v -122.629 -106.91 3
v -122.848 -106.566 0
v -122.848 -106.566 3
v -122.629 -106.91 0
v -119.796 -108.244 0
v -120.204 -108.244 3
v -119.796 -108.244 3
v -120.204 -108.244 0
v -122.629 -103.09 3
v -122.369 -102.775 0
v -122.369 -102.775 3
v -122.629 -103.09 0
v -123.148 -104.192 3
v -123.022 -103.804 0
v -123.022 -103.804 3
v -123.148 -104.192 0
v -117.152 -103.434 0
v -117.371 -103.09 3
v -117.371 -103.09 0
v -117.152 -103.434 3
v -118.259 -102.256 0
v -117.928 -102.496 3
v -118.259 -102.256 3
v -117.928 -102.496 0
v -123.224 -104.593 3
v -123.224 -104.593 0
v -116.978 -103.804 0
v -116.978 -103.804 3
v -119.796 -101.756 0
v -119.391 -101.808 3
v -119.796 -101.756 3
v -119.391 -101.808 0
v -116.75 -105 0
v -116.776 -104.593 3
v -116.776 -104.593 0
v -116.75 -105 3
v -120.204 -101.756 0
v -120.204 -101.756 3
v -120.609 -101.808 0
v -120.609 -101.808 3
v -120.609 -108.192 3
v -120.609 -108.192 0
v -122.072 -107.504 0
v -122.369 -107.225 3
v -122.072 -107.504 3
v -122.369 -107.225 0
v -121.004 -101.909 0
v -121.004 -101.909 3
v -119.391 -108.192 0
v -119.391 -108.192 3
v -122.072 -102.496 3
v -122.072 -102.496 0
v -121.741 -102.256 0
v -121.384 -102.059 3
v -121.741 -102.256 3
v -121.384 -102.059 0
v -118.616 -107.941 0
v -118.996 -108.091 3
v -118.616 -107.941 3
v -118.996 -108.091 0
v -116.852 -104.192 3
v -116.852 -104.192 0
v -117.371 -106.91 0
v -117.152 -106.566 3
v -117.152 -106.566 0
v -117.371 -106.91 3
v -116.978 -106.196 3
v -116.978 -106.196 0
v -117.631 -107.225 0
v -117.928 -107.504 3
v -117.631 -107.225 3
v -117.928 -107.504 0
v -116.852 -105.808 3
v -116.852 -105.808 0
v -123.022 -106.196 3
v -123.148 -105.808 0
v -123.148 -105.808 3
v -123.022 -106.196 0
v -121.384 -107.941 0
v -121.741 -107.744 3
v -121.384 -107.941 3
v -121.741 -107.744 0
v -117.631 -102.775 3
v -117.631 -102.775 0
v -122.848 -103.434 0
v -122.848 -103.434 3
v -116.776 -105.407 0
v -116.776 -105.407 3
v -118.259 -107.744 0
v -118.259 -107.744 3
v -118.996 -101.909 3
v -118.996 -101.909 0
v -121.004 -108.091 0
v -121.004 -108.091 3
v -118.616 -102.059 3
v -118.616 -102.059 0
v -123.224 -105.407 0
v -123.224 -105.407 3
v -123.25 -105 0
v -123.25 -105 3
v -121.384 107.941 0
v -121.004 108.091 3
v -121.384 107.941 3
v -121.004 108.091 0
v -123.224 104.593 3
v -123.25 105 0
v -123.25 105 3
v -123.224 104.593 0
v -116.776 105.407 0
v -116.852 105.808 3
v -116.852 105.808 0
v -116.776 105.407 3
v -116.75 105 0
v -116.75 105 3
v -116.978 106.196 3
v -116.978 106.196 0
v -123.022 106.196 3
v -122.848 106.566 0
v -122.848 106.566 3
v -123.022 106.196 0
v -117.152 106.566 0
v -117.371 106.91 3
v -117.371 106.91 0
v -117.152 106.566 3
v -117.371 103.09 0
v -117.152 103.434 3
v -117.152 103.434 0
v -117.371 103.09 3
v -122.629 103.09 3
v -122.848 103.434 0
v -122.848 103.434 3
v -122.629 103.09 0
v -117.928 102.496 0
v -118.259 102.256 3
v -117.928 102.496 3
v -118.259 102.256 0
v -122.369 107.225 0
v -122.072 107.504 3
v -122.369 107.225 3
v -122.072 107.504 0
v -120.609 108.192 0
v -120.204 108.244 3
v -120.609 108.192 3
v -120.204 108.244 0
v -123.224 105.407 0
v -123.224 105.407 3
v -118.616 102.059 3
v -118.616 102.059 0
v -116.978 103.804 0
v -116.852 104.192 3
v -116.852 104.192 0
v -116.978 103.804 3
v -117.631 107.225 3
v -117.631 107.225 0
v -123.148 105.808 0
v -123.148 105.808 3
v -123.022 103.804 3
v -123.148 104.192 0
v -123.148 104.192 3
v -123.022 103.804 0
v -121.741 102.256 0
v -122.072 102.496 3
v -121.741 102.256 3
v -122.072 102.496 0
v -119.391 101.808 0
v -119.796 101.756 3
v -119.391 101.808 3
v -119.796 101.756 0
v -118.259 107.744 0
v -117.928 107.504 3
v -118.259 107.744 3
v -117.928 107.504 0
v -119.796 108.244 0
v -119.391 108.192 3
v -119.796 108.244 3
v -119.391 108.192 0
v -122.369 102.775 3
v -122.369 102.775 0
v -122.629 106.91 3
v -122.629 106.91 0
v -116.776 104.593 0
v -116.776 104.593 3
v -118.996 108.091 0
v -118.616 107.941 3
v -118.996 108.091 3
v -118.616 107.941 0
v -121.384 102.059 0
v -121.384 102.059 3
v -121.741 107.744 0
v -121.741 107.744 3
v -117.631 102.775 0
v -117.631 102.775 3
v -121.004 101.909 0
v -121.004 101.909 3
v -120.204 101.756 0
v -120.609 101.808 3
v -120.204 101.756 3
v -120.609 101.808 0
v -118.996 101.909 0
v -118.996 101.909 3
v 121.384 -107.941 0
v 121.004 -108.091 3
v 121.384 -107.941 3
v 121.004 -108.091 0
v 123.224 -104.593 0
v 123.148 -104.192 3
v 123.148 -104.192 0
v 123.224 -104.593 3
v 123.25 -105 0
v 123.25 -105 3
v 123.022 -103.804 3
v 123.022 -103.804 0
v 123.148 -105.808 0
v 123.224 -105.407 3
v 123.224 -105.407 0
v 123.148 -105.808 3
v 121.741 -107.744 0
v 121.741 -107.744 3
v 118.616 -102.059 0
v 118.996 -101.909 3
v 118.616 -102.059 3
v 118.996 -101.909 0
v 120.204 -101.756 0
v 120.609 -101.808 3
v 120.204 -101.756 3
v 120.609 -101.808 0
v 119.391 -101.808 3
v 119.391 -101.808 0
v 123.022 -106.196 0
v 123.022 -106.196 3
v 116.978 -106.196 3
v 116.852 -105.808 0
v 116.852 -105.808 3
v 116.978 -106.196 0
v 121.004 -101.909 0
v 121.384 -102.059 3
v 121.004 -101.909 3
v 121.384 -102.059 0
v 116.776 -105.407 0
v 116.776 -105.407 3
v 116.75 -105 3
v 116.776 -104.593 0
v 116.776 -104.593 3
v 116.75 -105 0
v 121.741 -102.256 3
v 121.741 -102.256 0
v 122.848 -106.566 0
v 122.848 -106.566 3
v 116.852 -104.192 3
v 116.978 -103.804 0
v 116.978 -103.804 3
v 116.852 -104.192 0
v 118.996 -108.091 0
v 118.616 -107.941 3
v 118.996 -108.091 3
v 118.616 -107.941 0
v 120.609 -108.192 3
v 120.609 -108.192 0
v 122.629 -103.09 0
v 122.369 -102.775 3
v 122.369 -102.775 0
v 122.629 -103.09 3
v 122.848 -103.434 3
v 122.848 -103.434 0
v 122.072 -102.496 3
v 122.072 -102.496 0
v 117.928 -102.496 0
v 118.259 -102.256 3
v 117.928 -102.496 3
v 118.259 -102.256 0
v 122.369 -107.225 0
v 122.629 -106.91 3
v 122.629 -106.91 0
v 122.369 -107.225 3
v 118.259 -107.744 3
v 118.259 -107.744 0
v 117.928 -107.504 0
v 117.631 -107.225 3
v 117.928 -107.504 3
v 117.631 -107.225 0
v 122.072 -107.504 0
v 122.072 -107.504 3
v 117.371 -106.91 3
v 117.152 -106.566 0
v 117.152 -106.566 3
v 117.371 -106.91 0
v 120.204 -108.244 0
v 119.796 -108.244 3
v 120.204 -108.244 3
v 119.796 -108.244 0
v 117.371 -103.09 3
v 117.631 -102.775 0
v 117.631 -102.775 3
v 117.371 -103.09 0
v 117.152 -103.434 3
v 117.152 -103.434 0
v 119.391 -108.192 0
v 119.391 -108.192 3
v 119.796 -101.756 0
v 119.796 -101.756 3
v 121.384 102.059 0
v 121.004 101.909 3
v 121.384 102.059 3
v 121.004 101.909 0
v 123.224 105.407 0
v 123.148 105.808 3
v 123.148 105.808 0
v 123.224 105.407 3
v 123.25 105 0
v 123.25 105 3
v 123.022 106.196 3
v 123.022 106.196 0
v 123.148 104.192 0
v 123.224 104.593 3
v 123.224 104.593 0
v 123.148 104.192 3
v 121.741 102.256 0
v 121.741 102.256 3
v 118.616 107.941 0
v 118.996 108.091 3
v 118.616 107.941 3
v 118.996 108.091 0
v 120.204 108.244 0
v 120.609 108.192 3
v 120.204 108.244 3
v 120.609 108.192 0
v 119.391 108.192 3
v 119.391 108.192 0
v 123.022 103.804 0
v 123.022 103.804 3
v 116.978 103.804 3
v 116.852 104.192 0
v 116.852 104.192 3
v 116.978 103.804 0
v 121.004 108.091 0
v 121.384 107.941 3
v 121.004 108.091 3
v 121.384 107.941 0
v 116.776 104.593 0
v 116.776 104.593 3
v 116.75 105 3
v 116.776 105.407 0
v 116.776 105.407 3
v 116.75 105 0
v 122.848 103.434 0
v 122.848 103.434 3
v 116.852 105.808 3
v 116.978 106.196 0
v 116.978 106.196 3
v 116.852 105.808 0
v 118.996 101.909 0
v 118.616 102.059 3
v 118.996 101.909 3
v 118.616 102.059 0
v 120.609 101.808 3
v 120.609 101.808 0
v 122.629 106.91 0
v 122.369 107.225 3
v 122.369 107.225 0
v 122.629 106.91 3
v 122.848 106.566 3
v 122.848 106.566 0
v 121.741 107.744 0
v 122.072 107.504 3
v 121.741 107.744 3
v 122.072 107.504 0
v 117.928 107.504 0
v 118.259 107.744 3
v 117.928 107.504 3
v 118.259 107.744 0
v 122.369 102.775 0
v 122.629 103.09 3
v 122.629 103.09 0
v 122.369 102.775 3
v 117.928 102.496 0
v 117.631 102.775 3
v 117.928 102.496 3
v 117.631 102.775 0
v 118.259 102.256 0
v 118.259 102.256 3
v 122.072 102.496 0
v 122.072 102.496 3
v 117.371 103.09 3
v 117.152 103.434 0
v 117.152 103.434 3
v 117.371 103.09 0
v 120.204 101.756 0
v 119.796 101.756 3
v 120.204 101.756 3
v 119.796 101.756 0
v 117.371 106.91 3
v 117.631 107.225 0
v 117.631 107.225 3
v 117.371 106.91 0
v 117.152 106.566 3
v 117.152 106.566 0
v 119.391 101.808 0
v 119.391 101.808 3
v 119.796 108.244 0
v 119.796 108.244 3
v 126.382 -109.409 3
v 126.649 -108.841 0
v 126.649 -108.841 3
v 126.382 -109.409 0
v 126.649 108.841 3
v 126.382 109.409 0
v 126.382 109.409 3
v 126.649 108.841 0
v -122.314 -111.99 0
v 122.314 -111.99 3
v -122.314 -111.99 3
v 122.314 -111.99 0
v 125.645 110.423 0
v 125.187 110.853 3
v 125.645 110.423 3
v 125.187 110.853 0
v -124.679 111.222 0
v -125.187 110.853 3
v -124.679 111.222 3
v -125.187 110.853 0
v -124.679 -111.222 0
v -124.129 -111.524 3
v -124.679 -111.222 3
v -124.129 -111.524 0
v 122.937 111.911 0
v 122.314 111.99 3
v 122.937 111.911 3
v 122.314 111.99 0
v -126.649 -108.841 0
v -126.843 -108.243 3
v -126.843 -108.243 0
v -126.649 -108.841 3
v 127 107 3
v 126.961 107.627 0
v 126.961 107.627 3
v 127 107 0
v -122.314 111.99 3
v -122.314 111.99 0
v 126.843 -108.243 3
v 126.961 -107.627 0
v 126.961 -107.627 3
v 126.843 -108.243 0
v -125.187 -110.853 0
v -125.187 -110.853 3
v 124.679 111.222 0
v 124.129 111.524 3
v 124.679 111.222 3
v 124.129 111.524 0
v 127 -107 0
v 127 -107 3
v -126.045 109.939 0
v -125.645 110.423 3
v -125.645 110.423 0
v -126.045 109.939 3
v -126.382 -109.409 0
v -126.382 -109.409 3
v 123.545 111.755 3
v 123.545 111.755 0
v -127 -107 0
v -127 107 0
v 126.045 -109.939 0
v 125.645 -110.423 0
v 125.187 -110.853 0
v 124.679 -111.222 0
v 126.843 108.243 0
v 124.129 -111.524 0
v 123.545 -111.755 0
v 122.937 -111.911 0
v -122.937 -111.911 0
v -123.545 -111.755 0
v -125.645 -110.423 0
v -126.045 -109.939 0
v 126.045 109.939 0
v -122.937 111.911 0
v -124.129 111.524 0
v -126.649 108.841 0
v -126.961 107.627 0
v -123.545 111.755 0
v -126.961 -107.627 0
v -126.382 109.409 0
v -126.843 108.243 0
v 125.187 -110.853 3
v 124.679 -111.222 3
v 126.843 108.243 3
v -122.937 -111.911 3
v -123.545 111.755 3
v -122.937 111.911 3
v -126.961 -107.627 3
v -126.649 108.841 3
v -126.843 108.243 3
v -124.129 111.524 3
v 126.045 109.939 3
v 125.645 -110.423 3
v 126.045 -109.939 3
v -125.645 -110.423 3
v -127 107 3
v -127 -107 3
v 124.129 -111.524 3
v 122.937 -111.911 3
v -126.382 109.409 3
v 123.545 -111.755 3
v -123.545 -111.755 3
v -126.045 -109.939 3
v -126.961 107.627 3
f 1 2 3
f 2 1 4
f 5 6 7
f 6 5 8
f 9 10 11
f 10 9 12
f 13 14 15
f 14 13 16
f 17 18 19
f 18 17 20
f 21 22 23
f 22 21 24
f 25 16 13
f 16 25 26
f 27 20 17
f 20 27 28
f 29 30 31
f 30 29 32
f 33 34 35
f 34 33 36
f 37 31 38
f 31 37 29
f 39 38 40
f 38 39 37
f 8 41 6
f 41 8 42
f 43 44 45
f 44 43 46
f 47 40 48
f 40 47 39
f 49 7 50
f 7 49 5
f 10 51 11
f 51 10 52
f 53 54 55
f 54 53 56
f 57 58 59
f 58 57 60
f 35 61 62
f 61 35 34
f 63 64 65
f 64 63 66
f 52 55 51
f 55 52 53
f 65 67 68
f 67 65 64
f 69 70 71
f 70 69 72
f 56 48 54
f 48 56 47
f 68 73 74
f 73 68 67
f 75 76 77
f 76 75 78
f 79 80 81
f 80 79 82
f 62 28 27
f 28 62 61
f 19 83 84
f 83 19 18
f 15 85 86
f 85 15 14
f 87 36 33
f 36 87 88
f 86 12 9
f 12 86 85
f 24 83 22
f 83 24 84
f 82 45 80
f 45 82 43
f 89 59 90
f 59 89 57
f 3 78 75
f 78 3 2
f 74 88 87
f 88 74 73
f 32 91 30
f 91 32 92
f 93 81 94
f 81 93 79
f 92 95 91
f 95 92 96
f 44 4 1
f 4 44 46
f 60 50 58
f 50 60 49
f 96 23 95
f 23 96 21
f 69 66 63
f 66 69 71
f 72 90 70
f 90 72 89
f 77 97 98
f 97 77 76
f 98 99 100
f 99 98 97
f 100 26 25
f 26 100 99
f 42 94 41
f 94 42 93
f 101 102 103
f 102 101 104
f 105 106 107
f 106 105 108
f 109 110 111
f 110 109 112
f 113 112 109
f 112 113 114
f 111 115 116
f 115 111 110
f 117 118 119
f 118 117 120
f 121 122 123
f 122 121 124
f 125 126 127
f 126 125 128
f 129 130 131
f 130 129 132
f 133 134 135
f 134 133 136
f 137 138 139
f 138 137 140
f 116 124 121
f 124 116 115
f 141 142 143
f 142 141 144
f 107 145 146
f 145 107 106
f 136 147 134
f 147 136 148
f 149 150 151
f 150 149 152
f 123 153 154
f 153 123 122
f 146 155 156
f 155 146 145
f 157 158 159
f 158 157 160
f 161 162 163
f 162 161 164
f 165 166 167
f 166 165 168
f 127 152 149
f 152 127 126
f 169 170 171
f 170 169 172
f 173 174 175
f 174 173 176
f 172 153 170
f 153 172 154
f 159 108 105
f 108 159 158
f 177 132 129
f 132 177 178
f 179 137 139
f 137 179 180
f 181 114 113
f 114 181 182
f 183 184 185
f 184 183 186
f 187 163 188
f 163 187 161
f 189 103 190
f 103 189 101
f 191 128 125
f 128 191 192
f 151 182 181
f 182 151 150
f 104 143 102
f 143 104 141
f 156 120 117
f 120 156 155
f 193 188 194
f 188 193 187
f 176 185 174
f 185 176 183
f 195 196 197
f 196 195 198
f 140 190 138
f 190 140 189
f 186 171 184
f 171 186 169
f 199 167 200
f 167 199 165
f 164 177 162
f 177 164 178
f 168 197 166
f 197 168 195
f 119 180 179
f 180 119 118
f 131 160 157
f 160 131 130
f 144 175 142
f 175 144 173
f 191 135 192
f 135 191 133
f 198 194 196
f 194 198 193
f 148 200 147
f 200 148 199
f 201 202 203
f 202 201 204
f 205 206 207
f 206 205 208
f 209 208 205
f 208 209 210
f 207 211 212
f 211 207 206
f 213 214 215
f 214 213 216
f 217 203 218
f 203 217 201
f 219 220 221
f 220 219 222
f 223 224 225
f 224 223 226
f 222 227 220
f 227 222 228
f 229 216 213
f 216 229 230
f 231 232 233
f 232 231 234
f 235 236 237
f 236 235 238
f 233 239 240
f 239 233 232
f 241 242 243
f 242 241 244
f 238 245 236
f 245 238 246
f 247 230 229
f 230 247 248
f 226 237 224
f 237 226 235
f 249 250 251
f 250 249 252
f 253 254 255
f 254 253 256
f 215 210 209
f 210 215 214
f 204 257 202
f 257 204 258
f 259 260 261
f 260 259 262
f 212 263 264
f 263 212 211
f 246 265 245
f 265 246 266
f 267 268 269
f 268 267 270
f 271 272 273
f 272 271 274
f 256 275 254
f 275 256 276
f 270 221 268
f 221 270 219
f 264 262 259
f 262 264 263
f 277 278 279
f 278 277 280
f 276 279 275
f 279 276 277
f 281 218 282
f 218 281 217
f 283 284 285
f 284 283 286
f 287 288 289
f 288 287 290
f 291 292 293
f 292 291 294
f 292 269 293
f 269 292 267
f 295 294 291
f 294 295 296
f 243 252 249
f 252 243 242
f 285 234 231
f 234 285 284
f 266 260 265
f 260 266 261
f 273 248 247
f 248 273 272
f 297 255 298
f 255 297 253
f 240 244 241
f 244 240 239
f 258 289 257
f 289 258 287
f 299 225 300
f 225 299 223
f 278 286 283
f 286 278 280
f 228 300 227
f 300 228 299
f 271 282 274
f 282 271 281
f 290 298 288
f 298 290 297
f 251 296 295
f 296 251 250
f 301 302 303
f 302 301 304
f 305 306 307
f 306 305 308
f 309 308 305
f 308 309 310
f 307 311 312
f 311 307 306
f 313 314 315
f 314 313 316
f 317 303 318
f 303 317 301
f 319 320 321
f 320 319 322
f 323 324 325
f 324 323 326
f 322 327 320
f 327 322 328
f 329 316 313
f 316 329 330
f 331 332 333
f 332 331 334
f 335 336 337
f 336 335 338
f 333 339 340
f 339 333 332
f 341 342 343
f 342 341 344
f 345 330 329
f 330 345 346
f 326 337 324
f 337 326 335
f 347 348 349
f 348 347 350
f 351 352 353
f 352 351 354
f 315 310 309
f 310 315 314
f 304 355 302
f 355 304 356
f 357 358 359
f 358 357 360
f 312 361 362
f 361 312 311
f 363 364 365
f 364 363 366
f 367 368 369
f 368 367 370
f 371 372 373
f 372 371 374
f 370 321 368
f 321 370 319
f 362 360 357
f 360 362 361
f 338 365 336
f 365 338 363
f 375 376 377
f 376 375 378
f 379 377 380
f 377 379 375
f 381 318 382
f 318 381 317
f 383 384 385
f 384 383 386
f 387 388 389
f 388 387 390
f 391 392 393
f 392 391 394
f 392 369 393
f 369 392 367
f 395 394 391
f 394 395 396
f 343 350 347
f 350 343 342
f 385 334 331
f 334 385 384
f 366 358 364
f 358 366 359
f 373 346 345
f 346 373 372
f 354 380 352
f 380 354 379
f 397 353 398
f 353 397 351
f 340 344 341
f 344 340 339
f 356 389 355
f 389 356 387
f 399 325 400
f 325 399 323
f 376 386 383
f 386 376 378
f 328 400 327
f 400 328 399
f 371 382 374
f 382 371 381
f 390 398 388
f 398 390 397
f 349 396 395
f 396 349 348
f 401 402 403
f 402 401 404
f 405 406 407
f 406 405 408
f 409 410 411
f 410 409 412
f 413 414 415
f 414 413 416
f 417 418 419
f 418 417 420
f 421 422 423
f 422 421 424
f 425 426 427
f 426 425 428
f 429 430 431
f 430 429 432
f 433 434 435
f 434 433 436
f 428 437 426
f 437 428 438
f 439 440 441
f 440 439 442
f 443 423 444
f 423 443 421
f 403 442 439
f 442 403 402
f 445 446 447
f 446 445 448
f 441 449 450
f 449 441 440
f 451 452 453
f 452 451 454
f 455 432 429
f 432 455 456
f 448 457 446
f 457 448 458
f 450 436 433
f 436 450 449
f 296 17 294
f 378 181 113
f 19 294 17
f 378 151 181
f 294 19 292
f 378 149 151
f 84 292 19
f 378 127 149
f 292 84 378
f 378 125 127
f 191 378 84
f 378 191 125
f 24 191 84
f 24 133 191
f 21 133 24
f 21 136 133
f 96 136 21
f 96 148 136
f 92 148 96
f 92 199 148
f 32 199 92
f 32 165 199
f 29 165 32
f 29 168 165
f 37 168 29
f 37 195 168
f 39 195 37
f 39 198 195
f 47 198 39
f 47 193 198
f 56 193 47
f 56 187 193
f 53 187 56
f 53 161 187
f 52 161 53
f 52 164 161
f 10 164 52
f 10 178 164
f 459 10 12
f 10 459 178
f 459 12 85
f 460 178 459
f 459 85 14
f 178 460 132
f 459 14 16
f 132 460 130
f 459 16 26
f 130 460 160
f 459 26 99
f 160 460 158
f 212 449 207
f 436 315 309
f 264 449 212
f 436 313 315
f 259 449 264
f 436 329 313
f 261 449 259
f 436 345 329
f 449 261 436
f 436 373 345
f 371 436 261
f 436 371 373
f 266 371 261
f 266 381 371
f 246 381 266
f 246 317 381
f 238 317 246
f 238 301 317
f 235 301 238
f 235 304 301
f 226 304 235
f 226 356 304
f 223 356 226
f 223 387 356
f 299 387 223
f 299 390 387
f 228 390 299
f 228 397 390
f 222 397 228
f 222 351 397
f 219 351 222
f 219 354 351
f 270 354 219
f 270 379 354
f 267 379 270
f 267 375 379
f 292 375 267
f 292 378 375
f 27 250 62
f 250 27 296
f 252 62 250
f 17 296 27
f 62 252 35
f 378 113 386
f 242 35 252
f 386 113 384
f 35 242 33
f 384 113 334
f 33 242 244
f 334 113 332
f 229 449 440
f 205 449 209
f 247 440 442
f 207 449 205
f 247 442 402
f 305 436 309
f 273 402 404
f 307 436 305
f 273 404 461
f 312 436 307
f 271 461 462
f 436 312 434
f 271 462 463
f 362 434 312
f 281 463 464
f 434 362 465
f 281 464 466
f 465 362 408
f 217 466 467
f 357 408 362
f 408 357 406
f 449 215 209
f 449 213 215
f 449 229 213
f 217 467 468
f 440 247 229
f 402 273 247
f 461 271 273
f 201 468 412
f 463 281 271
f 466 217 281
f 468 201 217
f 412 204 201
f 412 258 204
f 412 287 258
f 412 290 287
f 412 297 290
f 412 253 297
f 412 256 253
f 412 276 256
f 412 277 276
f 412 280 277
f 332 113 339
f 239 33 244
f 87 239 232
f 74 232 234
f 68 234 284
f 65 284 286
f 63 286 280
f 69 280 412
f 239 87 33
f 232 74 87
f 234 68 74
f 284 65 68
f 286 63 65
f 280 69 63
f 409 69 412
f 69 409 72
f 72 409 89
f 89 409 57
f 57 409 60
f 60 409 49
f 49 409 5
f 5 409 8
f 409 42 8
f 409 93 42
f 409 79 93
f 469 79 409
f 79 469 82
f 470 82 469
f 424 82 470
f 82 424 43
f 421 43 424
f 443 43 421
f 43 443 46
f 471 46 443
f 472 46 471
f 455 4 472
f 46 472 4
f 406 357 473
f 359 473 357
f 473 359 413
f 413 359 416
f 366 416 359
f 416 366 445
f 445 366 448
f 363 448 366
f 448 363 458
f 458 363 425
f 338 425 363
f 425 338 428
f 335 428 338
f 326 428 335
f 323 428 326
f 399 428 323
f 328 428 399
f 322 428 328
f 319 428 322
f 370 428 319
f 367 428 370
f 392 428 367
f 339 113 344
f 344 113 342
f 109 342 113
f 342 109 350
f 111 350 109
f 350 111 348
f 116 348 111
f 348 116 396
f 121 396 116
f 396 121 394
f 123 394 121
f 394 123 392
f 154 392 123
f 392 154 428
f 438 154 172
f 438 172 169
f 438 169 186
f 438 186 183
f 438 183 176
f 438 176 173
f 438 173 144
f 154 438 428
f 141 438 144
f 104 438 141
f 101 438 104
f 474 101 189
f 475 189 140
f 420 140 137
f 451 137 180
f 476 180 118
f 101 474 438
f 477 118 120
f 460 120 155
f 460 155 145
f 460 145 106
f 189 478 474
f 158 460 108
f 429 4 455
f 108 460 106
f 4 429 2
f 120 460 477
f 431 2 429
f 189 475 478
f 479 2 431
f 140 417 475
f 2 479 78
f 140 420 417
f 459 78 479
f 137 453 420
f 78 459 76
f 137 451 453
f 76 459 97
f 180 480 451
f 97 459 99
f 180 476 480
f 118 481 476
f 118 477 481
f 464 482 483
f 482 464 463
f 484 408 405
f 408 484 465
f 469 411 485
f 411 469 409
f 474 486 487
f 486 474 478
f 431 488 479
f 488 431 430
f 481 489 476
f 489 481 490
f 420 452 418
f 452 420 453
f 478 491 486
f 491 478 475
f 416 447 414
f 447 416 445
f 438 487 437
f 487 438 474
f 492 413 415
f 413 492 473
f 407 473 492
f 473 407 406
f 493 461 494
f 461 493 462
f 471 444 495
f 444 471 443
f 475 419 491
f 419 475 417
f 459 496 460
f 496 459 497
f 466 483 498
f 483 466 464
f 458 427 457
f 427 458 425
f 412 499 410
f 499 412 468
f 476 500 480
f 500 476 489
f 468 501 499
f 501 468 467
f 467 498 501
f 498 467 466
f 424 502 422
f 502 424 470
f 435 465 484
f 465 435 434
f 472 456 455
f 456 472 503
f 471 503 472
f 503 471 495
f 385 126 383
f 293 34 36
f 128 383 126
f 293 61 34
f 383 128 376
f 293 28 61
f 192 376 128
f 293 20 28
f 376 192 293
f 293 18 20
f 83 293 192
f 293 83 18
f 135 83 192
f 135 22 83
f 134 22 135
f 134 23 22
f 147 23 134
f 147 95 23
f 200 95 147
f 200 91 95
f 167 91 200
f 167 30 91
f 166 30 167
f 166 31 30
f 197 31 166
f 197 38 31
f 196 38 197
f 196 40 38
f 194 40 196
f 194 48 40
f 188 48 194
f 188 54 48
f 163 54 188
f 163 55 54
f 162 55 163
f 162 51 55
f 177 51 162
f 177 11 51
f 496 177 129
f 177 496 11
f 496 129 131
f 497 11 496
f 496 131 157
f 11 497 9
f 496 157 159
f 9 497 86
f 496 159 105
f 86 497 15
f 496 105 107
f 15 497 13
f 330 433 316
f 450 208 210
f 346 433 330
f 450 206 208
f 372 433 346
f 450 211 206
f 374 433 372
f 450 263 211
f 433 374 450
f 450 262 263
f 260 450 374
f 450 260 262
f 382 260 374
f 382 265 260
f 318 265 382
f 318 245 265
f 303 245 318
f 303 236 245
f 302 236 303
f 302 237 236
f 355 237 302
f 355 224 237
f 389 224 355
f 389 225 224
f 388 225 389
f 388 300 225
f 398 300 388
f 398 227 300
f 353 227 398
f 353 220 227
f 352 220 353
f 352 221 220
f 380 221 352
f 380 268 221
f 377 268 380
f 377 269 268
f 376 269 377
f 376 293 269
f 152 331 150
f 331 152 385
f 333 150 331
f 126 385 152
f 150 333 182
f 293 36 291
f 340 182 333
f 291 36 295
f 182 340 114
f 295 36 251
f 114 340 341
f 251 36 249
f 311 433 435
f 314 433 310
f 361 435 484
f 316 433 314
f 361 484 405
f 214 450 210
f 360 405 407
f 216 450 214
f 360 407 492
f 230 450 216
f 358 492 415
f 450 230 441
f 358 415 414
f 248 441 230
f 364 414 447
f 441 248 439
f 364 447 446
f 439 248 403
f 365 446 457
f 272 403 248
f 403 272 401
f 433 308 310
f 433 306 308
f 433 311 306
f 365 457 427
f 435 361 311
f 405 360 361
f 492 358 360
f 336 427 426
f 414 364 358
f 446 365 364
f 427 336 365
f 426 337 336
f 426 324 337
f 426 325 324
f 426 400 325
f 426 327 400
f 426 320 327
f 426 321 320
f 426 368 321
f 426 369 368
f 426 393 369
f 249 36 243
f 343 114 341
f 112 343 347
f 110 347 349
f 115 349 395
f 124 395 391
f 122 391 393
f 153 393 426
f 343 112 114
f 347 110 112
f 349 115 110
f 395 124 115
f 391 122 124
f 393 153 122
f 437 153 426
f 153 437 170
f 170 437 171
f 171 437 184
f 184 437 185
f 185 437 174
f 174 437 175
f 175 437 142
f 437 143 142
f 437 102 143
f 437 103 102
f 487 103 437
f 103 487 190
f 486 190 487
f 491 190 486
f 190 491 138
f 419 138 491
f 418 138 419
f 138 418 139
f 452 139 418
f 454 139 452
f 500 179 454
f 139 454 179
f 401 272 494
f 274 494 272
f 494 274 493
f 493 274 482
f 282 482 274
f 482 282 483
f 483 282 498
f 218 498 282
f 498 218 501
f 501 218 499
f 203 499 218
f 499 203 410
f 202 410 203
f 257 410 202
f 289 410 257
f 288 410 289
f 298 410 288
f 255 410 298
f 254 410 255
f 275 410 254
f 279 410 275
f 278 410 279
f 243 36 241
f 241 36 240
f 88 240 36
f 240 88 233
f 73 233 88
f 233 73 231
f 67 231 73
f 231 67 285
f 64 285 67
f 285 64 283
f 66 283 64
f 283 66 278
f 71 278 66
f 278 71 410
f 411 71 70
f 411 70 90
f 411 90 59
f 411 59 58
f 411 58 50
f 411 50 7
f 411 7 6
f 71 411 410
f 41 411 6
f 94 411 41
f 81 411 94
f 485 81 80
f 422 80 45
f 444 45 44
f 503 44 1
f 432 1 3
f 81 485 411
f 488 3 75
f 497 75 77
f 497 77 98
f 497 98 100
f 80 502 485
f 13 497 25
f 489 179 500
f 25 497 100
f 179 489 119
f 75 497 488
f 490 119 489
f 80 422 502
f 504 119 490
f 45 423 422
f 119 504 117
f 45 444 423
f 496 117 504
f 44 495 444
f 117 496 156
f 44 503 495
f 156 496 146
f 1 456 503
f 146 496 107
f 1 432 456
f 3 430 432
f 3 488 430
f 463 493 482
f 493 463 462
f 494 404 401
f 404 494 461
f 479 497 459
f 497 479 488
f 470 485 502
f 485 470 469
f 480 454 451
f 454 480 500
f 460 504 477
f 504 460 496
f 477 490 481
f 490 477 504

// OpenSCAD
$fn = 50;


difference() {
	union() {
		hull() {
			translate(v = [-122.0000000000, 107.0000000000, 0]) {
				cylinder(h = 3, r = 5);
			}
			translate(v = [122.0000000000, 107.0000000000, 0]) {
				cylinder(h = 3, r = 5);
			}
			translate(v = [-122.0000000000, -107.0000000000, 0]) {
				cylinder(h = 3, r = 5);
			}
			translate(v = [122.0000000000, -107.0000000000, 0]) {
				cylinder(h = 3, r = 5);
			}
		}
	}
	union() {
		translate(v = [-120.0000000000, -105.0000000000, -100.0000000000]) {
			cylinder(h = 200, r = 3.2500000000);
		}
		translate(v = [-120.0000000000, 105.0000000000, -100.0000000000]) {
			cylinder(h = 200, r = 3.2500000000);
		}
		translate(v = [120.0000000000, -105.0000000000, -100.0000000000]) {
			cylinder(h = 200, r = 3.2500000000);
		}
		translate(v = [120.0000000000, 105.0000000000, -100.0000000000]) {
			cylinder(h = 200, r = 3.2500000000);
		}
	}
}
